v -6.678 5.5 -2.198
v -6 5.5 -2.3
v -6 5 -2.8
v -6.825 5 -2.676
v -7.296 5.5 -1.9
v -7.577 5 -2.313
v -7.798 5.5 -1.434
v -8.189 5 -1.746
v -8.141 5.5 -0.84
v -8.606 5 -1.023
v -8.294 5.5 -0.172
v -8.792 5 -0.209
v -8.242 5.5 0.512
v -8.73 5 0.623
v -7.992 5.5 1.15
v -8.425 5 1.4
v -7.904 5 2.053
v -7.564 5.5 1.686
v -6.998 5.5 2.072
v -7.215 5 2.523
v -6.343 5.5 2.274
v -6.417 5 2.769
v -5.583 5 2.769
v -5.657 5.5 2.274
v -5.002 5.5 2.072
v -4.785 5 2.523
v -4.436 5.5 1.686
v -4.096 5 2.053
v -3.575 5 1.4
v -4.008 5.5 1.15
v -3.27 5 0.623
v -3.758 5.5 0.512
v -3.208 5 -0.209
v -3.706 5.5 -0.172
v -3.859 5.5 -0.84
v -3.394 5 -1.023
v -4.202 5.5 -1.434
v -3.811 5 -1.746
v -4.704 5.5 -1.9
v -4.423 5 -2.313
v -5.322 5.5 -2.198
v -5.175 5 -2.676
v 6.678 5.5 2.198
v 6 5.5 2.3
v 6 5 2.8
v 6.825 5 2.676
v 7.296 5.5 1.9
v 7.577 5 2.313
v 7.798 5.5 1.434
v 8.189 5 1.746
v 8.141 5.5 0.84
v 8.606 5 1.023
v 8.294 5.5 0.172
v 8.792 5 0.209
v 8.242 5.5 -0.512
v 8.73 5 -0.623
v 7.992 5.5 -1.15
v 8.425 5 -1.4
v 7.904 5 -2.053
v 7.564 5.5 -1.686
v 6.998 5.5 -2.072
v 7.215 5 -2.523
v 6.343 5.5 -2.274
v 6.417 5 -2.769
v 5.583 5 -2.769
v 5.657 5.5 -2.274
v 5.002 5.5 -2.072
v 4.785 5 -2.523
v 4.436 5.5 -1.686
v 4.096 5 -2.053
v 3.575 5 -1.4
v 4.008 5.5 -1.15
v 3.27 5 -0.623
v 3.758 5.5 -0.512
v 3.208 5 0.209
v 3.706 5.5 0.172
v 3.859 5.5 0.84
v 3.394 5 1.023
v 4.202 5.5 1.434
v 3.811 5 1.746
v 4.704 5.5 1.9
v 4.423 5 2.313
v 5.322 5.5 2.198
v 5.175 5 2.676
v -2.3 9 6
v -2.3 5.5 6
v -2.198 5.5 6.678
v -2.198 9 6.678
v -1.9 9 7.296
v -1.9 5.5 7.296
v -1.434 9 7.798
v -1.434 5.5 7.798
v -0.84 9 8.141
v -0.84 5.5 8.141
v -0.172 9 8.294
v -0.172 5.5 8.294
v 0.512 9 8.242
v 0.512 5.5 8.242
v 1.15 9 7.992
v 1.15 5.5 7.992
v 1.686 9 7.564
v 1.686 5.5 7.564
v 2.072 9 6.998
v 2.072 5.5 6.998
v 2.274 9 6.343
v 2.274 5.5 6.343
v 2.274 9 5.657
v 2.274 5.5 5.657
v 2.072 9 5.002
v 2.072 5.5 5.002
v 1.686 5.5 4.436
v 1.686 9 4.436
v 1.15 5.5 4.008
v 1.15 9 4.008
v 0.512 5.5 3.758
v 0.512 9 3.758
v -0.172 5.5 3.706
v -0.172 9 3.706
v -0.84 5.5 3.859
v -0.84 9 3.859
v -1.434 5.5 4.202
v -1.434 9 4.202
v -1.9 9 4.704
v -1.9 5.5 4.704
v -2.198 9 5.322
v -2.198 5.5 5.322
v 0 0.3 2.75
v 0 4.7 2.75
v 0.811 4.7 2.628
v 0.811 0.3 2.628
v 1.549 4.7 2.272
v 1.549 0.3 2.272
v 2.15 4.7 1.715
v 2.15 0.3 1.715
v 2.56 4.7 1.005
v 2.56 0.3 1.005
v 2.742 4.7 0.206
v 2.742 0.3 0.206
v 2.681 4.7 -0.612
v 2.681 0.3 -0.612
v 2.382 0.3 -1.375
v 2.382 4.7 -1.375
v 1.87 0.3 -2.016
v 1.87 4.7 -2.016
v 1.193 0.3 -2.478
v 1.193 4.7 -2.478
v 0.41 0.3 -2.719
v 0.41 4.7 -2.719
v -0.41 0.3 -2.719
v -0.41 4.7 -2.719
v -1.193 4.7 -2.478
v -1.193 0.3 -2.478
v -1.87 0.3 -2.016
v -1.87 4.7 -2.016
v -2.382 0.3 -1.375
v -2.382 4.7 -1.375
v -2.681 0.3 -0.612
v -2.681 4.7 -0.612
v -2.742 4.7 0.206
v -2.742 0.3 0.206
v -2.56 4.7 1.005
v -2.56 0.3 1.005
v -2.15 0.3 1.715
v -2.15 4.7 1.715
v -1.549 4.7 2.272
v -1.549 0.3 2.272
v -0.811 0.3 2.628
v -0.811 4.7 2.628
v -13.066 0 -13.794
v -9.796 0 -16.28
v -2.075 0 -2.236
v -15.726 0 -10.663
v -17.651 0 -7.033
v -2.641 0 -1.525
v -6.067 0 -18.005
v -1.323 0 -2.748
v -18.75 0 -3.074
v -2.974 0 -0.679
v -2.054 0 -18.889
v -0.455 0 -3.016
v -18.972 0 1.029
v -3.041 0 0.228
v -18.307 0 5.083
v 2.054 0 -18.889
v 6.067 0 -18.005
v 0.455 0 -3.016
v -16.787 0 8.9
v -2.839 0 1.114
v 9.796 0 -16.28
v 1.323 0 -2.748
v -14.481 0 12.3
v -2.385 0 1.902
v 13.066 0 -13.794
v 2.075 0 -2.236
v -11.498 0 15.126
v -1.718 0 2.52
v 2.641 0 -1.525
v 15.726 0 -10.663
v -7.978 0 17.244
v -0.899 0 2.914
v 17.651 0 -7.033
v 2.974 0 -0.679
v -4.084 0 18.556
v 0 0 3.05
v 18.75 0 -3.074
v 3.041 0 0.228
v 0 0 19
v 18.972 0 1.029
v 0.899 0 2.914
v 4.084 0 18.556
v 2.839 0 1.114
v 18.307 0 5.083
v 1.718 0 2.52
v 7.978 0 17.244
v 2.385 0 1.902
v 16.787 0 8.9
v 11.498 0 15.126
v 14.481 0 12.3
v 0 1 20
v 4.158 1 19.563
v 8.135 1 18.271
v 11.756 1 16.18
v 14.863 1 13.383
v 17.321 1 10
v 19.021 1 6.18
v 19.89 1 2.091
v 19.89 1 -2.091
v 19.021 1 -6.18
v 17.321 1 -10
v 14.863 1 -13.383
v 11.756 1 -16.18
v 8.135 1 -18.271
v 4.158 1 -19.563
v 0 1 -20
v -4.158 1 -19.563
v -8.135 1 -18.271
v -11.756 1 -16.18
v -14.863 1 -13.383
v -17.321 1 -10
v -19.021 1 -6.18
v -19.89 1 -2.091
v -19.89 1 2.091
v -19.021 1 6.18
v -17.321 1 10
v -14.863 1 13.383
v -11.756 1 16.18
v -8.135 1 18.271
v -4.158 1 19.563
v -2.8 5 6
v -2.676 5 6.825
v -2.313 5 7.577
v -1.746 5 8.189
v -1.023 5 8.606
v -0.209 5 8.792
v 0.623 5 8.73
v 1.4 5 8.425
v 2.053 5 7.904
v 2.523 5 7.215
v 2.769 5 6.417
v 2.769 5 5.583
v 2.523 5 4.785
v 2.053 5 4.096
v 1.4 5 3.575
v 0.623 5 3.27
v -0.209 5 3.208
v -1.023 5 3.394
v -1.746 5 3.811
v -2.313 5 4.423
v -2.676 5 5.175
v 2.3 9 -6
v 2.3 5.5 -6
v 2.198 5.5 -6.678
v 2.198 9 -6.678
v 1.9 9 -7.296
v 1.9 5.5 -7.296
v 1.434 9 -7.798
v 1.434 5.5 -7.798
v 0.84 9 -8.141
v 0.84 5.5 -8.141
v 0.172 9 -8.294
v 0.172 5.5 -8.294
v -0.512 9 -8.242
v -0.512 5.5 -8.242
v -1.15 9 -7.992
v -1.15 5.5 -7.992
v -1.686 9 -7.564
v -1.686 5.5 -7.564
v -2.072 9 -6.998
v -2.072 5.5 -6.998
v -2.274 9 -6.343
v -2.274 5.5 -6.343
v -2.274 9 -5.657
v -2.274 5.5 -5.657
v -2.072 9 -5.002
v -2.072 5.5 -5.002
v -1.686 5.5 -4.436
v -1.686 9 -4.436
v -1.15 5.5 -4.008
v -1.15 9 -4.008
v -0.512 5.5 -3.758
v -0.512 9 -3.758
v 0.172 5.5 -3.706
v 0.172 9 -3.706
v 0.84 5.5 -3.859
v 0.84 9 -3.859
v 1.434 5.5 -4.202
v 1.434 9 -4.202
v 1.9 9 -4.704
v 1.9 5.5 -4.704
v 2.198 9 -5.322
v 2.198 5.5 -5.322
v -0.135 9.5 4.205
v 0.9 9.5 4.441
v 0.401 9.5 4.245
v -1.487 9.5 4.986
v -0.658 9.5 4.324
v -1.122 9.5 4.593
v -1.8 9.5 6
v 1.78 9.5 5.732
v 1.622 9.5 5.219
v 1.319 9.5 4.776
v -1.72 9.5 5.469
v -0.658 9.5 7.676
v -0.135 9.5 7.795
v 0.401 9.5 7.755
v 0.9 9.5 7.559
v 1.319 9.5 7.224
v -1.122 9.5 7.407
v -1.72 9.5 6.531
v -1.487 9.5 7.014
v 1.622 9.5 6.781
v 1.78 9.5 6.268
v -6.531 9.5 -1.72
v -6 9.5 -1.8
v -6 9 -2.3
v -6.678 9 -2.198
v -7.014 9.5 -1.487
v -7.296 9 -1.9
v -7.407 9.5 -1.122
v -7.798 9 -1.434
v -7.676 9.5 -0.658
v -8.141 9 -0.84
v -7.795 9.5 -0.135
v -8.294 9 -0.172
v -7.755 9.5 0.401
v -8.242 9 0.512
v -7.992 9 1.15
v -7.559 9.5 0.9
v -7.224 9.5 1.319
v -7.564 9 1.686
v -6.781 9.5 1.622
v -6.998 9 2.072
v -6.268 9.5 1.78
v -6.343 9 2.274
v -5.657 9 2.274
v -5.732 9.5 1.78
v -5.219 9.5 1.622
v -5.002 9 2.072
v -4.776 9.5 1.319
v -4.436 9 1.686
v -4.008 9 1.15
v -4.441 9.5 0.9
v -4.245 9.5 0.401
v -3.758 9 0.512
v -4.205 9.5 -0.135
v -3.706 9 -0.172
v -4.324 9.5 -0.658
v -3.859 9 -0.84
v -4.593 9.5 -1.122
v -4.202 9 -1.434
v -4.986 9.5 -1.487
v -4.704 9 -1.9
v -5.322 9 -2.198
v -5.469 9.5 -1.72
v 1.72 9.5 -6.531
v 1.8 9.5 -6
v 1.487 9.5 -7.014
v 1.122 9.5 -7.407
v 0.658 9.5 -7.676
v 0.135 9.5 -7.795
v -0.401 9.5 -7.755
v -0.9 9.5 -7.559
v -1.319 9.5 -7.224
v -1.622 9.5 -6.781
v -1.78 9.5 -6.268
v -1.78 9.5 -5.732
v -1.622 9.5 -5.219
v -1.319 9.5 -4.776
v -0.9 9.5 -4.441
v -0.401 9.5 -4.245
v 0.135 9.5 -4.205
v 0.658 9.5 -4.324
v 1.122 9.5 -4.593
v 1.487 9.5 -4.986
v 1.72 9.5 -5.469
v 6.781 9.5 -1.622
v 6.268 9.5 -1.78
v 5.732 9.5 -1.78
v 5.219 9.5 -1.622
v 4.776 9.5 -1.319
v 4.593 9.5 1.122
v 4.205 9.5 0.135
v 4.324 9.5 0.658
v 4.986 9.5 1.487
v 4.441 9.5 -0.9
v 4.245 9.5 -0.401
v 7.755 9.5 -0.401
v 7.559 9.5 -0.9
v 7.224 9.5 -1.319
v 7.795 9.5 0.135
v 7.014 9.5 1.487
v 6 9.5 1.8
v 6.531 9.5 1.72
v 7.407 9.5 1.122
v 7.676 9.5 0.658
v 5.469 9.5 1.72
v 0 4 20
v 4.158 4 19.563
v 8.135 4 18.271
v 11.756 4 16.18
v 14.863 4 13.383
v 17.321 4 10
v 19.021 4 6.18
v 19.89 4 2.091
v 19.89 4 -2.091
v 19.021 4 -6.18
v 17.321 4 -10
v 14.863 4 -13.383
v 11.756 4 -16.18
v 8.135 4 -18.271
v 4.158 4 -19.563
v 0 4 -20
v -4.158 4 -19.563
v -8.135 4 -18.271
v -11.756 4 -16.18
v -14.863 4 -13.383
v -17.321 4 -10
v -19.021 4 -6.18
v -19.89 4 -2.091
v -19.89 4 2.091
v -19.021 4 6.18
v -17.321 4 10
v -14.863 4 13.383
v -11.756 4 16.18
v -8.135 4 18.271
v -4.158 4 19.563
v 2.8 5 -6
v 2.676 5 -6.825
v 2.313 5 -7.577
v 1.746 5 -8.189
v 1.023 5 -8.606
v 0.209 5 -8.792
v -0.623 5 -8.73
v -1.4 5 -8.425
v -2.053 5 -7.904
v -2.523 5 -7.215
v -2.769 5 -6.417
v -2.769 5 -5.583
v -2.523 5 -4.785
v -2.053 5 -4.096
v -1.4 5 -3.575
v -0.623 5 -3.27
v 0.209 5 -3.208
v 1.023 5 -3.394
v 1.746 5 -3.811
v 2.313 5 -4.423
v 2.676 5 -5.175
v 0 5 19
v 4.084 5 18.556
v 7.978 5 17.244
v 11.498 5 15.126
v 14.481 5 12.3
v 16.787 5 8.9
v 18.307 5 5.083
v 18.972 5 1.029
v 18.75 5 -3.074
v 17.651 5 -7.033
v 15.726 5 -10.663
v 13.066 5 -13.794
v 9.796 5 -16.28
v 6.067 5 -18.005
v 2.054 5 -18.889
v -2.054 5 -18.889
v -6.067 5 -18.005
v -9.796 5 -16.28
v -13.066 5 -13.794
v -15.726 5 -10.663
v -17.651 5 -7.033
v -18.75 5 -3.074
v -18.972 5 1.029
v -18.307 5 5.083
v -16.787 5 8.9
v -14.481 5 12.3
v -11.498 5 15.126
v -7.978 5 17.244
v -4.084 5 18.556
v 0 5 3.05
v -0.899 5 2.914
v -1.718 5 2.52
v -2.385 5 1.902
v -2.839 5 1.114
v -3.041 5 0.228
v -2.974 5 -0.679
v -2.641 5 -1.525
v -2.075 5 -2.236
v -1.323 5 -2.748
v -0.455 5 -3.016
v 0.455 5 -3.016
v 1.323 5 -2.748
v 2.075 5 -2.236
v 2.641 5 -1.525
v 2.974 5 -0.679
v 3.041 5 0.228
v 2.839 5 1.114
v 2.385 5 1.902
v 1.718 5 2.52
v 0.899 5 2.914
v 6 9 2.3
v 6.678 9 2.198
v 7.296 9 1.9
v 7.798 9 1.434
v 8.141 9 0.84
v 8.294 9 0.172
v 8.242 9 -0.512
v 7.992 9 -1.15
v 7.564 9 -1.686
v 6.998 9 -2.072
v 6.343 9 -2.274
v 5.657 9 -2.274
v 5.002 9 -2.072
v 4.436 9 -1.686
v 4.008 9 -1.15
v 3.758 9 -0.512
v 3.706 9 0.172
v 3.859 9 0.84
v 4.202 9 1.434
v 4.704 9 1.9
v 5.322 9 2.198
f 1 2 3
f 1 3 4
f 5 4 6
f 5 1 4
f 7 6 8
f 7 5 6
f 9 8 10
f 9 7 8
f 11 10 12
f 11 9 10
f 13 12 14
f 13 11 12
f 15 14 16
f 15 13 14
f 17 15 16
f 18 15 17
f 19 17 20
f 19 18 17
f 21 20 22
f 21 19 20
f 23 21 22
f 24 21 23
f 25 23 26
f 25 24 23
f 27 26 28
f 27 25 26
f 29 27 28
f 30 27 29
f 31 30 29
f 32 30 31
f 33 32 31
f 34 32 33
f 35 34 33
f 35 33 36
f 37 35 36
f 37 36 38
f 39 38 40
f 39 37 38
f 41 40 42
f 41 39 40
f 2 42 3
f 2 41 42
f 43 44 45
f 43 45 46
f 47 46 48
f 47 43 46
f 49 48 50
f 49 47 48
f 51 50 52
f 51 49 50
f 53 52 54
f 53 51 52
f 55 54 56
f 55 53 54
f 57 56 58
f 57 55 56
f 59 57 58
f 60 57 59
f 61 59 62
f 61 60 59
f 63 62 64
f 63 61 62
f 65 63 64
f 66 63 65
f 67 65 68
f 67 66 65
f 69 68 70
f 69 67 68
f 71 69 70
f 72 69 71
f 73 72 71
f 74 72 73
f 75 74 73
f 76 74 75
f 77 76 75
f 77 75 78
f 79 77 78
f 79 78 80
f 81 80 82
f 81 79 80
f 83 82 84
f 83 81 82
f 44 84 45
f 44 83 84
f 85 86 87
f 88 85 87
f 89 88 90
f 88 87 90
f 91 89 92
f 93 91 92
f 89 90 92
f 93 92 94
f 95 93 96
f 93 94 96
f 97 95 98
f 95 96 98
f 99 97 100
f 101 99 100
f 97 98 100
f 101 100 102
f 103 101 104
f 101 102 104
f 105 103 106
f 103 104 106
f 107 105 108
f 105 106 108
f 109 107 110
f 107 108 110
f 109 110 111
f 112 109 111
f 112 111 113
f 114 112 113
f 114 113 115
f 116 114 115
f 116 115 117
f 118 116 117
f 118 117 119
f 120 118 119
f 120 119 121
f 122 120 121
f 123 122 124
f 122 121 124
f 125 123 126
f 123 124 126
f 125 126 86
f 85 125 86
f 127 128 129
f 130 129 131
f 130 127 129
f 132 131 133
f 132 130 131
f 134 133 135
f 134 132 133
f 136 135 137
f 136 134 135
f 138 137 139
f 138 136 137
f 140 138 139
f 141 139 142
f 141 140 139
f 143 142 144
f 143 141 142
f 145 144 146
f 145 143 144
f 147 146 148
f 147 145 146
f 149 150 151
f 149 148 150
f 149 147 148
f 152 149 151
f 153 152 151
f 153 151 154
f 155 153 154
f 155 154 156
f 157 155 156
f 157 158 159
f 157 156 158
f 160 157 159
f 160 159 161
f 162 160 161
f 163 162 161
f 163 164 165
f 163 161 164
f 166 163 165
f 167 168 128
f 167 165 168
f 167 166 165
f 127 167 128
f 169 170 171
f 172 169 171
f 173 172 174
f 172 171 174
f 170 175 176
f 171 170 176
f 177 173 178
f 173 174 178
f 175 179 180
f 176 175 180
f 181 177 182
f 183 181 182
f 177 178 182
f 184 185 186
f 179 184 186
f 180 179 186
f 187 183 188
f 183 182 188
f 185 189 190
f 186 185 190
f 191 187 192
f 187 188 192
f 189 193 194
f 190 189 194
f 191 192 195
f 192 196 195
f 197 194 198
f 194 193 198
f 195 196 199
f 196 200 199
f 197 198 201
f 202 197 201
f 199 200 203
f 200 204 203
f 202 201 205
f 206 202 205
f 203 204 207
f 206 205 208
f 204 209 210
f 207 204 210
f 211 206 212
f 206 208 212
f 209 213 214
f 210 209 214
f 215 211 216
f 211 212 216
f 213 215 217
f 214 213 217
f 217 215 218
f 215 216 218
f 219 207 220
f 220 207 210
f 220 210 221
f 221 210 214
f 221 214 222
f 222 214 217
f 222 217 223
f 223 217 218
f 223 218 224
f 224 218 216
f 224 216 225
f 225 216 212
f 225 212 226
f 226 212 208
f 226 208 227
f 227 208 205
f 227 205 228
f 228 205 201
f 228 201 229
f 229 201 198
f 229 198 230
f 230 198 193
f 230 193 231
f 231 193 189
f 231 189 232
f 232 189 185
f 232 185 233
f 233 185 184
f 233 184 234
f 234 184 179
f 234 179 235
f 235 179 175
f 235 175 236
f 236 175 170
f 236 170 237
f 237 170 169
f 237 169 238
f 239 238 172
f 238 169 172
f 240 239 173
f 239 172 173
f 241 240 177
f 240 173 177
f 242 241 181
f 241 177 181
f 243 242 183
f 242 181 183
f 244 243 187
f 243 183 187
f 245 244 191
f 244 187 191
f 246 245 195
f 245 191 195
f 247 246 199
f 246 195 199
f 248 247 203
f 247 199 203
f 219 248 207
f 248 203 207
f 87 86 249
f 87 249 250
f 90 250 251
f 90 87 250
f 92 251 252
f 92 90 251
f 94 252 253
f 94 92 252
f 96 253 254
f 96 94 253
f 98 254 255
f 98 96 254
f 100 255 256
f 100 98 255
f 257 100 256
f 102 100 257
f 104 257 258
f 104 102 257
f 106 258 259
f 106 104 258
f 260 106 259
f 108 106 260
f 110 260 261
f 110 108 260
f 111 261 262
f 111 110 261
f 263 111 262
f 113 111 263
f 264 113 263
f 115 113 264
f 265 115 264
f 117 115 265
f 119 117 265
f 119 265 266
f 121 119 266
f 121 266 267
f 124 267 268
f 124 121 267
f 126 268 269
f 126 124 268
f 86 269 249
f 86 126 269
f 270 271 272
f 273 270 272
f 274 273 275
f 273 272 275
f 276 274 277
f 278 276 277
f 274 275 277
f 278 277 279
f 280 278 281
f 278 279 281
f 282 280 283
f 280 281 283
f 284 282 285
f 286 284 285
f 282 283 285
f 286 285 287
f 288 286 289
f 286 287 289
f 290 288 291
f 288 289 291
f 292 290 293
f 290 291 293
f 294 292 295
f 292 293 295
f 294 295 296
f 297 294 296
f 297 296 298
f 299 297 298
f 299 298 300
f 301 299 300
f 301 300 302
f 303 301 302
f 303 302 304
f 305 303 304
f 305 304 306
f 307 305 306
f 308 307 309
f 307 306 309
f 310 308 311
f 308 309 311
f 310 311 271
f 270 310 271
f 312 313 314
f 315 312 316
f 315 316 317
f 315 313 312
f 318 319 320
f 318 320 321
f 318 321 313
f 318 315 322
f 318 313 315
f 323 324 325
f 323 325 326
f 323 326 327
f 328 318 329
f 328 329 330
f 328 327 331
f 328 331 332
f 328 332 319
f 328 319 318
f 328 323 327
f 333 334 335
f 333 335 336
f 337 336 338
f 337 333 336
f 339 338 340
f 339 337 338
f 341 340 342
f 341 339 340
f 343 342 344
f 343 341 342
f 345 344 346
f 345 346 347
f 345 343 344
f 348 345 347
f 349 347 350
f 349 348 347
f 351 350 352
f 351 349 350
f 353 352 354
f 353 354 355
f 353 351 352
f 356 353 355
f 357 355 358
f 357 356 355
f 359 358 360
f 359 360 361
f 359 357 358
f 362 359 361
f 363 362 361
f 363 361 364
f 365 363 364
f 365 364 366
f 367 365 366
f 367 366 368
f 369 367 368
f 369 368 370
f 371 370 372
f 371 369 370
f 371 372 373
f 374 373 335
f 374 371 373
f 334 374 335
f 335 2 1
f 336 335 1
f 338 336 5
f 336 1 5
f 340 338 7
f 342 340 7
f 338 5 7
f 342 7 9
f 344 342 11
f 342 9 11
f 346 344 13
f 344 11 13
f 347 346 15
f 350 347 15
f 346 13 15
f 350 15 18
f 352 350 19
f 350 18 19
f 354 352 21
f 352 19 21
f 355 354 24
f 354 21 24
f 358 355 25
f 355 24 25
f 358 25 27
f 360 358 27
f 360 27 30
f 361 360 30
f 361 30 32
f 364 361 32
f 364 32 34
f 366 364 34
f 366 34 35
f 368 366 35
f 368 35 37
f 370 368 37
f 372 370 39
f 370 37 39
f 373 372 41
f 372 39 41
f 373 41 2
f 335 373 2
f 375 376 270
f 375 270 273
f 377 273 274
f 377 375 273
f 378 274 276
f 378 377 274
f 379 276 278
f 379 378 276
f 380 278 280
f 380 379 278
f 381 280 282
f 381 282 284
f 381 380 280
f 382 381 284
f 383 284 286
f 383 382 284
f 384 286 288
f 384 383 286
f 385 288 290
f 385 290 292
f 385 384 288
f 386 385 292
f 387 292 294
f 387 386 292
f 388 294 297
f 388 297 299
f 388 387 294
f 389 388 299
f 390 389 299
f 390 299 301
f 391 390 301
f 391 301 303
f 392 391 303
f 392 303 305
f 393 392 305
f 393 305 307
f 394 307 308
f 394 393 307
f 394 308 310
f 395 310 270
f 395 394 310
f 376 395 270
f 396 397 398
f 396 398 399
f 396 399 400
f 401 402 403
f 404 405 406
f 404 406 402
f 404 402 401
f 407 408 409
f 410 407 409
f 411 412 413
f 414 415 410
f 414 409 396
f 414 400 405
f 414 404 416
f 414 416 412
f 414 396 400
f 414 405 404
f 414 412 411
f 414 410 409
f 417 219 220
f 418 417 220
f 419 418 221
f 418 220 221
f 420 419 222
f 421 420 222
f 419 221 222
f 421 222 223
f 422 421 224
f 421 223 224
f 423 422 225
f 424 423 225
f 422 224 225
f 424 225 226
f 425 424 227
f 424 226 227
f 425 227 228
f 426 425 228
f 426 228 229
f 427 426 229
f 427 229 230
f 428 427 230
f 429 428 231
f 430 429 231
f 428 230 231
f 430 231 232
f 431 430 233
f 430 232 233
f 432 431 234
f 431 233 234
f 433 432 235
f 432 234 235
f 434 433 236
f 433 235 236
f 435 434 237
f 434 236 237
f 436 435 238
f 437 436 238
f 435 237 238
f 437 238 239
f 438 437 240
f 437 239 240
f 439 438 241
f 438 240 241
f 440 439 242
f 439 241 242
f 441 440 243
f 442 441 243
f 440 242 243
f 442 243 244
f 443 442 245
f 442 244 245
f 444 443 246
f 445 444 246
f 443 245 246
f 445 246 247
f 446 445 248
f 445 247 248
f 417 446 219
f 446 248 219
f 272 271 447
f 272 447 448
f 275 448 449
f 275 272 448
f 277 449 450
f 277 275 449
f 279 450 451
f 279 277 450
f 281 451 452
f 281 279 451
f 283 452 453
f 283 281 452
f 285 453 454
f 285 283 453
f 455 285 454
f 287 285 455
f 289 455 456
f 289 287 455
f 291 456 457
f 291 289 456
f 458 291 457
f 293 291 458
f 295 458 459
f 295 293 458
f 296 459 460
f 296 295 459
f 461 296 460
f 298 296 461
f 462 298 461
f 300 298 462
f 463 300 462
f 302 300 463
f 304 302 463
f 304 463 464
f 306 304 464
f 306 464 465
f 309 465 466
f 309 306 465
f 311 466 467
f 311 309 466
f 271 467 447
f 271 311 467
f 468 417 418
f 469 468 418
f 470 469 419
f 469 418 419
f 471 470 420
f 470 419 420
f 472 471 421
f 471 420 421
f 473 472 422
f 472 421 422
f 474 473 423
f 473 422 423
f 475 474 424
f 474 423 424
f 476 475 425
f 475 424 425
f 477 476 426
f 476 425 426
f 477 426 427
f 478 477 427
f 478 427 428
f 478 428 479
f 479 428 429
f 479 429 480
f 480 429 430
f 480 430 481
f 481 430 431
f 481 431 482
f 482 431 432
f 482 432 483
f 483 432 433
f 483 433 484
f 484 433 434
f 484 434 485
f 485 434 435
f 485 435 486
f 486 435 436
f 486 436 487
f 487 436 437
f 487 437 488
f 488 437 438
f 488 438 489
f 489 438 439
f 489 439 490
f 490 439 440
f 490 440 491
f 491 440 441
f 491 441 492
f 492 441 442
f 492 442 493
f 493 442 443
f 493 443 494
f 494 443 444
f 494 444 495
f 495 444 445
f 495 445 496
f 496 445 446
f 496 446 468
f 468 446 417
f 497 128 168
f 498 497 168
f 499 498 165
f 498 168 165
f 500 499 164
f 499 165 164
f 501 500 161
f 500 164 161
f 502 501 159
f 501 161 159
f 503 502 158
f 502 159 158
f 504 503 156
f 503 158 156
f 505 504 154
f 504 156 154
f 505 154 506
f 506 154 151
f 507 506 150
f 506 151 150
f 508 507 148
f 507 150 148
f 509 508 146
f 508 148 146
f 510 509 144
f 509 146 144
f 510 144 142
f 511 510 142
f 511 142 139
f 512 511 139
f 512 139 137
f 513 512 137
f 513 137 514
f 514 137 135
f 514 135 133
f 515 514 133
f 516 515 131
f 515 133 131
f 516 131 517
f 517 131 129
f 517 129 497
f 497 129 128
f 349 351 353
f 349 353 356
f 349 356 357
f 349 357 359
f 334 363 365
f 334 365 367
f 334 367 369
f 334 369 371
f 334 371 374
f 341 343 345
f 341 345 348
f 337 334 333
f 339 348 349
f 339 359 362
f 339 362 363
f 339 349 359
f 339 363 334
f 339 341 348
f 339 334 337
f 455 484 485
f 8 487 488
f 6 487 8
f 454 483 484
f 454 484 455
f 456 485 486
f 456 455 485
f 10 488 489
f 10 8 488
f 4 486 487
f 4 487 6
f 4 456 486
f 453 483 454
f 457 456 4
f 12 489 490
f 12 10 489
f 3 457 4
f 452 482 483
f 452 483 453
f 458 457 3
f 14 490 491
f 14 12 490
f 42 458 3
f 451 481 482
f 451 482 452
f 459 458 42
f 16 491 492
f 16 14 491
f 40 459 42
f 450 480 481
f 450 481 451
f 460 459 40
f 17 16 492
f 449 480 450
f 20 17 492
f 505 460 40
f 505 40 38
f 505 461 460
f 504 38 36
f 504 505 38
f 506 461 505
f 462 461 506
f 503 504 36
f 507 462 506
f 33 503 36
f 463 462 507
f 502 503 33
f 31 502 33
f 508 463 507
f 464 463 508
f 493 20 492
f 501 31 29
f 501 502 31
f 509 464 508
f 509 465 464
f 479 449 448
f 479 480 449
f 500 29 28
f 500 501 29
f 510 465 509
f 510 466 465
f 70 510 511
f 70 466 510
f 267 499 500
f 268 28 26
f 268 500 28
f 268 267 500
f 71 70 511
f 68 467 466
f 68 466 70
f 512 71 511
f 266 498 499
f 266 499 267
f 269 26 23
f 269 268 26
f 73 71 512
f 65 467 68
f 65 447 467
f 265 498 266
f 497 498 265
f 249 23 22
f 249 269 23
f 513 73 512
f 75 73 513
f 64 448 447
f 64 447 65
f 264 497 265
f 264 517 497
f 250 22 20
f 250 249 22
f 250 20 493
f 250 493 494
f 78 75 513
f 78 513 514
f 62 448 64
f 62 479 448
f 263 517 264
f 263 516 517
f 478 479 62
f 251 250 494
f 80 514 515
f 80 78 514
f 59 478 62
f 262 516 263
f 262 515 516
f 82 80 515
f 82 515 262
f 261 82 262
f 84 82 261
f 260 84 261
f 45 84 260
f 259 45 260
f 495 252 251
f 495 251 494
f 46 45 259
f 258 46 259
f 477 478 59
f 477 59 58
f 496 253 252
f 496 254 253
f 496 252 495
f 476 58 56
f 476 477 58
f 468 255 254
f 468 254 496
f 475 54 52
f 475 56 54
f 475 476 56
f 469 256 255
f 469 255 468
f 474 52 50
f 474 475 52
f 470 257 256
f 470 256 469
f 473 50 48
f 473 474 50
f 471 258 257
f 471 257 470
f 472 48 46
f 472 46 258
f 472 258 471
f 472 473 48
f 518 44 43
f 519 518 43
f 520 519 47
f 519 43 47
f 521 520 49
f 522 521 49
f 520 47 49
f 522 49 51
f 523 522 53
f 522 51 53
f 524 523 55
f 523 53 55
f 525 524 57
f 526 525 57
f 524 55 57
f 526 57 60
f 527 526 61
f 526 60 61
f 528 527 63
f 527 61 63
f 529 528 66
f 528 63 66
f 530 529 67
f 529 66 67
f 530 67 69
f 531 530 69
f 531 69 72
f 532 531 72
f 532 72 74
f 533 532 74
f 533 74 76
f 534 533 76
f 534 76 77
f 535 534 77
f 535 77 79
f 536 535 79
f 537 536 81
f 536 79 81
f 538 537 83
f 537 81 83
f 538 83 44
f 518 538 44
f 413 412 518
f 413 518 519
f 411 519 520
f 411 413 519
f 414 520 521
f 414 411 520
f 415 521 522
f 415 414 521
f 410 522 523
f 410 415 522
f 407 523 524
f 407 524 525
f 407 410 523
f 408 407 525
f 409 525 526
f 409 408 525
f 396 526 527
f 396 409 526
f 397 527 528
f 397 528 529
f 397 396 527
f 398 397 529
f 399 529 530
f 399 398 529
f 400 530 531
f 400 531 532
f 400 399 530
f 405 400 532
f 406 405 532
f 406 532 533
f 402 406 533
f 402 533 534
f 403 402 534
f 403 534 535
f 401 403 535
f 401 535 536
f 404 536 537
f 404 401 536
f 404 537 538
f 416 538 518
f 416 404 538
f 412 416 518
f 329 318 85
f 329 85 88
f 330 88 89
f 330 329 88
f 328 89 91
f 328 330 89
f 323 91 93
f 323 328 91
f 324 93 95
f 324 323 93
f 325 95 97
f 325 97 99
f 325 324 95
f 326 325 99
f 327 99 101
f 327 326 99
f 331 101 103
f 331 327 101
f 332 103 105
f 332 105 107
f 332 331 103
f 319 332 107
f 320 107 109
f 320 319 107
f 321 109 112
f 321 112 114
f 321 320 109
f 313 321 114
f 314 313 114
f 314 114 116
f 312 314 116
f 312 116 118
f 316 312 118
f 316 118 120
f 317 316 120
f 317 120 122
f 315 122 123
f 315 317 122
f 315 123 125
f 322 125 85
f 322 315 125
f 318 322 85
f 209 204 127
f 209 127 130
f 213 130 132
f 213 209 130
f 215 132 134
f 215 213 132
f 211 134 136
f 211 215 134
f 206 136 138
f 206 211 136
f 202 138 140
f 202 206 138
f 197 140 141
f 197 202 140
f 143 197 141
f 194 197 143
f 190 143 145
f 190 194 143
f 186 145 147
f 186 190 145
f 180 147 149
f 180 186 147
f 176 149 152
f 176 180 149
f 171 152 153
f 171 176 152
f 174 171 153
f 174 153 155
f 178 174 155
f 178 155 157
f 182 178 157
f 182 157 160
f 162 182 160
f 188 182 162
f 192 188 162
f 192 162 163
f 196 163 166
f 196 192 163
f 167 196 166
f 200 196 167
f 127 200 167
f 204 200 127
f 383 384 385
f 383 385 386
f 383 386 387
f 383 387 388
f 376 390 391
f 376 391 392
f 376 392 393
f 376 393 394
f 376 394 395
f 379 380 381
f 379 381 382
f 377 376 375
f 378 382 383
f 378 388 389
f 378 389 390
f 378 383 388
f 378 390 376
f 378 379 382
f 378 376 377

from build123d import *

# Parameters (mm, degrees)
SKETCH_1_R                           = 20
EXTRUDE_1_DEPTH                      = 5
CUT_EXTRUDE_START                    = -5
SKETCH_4_R                           = 2.75
CUT_EXTRUDE_3_DEPTH                  = 15
SKETCH_7_R                           = 2.3
EXTRUDE_3_DEPTH                      = 4.5
CHAMFER_3_SIZE                       = 0.5
PATTERN_CIRCULAR_1_COUNT             = 4
CHAMFER_3_OF_PATTERN_CIRCULAR_1_SIZE = 0.5
CHAMFER_4_SIZE                       = 0.3
CHAMFER_5_SIZE                       = 1


with BuildPart() as part:
    # 草图1 → 凸台-拉伸1 (new body)
    with BuildSketch(Plane(origin=(0, 0, 0), x_dir=(1, 0, 0), z_dir=(0, 1, 0))):
        with Locations(Location((0, 0, 0), (0, 0, 270))):
            Circle(SKETCH_1_R)
    extrude(amount=EXTRUDE_1_DEPTH)

    # 草图4 → 切除-拉伸3 (cut)
    with BuildSketch(Plane(origin=(0, 5, 0), x_dir=(1, 0, 0), z_dir=(0, 1, 0)).offset(CUT_EXTRUDE_START)):
        with Locations(Location((0, 0, 0), (0, 0, 270))):
            Circle(SKETCH_4_R)
    extrude(amount=CUT_EXTRUDE_3_DEPTH, mode=Mode.SUBTRACT)

    # 草图7 → 凸台-拉伸3 (add)
    with BuildSketch(Plane(origin=(0, 5, 0), x_dir=(1, 0, 0), z_dir=(0, 1, 0))):
        with Locations(Location((6, 0, 0), (0, 0, 270))):
            Circle(SKETCH_7_R)
    extrude_3 = extrude(amount=EXTRUDE_3_DEPTH)

    # 倒角3
    chamfer_3_edges = [part.edges().sort_by_distance(p)[0] for p in [
        (6, 5, -2.3),
        (6, 9.5, -2.3),
    ]]
    chamfer(chamfer_3_edges, length=CHAMFER_3_SIZE)

    # 阵列(圆周)1: 凸台-拉伸3 ×4 about axis
    pattern_circular_1_axis = Axis((0, 0, 0), (0, 1, 0))
    for i in range(1, PATTERN_CIRCULAR_1_COUNT):
        add(extrude_3.rotate(pattern_circular_1_axis, i * 360 / PATTERN_CIRCULAR_1_COUNT))

    # 倒角3 of 阵列(圆周)1
    chamfer_3_of_pattern_circular_1_edges = [part.edges().sort_by_distance(p)[0] for p in [
        (-2.3, 5, -6),
        (-2.3, 9.5, -6),
        (-6, 5, 2.3),
        (-6, 9.5, 2.3),
        (2.3, 5, 6),
        (2.3, 9.5, 6),
    ]]
    chamfer(chamfer_3_of_pattern_circular_1_edges, length=CHAMFER_3_OF_PATTERN_CIRCULAR_1_SIZE)

    # 倒角4
    chamfer_4_edges = [part.edges().sort_by_distance(p)[0] for p in [
        (0, 5, -2.75),
        (0, 0, -2.75),
    ]]
    chamfer(chamfer_4_edges, length=CHAMFER_4_SIZE)

    # 倒角5
    chamfer_5_edges = [part.edges().sort_by_distance(p)[0] for p in [
        (0, 0, -20),
        (0, 5, -20),
    ]]
    chamfer(chamfer_5_edges, length=CHAMFER_5_SIZE)


solid = part.part
